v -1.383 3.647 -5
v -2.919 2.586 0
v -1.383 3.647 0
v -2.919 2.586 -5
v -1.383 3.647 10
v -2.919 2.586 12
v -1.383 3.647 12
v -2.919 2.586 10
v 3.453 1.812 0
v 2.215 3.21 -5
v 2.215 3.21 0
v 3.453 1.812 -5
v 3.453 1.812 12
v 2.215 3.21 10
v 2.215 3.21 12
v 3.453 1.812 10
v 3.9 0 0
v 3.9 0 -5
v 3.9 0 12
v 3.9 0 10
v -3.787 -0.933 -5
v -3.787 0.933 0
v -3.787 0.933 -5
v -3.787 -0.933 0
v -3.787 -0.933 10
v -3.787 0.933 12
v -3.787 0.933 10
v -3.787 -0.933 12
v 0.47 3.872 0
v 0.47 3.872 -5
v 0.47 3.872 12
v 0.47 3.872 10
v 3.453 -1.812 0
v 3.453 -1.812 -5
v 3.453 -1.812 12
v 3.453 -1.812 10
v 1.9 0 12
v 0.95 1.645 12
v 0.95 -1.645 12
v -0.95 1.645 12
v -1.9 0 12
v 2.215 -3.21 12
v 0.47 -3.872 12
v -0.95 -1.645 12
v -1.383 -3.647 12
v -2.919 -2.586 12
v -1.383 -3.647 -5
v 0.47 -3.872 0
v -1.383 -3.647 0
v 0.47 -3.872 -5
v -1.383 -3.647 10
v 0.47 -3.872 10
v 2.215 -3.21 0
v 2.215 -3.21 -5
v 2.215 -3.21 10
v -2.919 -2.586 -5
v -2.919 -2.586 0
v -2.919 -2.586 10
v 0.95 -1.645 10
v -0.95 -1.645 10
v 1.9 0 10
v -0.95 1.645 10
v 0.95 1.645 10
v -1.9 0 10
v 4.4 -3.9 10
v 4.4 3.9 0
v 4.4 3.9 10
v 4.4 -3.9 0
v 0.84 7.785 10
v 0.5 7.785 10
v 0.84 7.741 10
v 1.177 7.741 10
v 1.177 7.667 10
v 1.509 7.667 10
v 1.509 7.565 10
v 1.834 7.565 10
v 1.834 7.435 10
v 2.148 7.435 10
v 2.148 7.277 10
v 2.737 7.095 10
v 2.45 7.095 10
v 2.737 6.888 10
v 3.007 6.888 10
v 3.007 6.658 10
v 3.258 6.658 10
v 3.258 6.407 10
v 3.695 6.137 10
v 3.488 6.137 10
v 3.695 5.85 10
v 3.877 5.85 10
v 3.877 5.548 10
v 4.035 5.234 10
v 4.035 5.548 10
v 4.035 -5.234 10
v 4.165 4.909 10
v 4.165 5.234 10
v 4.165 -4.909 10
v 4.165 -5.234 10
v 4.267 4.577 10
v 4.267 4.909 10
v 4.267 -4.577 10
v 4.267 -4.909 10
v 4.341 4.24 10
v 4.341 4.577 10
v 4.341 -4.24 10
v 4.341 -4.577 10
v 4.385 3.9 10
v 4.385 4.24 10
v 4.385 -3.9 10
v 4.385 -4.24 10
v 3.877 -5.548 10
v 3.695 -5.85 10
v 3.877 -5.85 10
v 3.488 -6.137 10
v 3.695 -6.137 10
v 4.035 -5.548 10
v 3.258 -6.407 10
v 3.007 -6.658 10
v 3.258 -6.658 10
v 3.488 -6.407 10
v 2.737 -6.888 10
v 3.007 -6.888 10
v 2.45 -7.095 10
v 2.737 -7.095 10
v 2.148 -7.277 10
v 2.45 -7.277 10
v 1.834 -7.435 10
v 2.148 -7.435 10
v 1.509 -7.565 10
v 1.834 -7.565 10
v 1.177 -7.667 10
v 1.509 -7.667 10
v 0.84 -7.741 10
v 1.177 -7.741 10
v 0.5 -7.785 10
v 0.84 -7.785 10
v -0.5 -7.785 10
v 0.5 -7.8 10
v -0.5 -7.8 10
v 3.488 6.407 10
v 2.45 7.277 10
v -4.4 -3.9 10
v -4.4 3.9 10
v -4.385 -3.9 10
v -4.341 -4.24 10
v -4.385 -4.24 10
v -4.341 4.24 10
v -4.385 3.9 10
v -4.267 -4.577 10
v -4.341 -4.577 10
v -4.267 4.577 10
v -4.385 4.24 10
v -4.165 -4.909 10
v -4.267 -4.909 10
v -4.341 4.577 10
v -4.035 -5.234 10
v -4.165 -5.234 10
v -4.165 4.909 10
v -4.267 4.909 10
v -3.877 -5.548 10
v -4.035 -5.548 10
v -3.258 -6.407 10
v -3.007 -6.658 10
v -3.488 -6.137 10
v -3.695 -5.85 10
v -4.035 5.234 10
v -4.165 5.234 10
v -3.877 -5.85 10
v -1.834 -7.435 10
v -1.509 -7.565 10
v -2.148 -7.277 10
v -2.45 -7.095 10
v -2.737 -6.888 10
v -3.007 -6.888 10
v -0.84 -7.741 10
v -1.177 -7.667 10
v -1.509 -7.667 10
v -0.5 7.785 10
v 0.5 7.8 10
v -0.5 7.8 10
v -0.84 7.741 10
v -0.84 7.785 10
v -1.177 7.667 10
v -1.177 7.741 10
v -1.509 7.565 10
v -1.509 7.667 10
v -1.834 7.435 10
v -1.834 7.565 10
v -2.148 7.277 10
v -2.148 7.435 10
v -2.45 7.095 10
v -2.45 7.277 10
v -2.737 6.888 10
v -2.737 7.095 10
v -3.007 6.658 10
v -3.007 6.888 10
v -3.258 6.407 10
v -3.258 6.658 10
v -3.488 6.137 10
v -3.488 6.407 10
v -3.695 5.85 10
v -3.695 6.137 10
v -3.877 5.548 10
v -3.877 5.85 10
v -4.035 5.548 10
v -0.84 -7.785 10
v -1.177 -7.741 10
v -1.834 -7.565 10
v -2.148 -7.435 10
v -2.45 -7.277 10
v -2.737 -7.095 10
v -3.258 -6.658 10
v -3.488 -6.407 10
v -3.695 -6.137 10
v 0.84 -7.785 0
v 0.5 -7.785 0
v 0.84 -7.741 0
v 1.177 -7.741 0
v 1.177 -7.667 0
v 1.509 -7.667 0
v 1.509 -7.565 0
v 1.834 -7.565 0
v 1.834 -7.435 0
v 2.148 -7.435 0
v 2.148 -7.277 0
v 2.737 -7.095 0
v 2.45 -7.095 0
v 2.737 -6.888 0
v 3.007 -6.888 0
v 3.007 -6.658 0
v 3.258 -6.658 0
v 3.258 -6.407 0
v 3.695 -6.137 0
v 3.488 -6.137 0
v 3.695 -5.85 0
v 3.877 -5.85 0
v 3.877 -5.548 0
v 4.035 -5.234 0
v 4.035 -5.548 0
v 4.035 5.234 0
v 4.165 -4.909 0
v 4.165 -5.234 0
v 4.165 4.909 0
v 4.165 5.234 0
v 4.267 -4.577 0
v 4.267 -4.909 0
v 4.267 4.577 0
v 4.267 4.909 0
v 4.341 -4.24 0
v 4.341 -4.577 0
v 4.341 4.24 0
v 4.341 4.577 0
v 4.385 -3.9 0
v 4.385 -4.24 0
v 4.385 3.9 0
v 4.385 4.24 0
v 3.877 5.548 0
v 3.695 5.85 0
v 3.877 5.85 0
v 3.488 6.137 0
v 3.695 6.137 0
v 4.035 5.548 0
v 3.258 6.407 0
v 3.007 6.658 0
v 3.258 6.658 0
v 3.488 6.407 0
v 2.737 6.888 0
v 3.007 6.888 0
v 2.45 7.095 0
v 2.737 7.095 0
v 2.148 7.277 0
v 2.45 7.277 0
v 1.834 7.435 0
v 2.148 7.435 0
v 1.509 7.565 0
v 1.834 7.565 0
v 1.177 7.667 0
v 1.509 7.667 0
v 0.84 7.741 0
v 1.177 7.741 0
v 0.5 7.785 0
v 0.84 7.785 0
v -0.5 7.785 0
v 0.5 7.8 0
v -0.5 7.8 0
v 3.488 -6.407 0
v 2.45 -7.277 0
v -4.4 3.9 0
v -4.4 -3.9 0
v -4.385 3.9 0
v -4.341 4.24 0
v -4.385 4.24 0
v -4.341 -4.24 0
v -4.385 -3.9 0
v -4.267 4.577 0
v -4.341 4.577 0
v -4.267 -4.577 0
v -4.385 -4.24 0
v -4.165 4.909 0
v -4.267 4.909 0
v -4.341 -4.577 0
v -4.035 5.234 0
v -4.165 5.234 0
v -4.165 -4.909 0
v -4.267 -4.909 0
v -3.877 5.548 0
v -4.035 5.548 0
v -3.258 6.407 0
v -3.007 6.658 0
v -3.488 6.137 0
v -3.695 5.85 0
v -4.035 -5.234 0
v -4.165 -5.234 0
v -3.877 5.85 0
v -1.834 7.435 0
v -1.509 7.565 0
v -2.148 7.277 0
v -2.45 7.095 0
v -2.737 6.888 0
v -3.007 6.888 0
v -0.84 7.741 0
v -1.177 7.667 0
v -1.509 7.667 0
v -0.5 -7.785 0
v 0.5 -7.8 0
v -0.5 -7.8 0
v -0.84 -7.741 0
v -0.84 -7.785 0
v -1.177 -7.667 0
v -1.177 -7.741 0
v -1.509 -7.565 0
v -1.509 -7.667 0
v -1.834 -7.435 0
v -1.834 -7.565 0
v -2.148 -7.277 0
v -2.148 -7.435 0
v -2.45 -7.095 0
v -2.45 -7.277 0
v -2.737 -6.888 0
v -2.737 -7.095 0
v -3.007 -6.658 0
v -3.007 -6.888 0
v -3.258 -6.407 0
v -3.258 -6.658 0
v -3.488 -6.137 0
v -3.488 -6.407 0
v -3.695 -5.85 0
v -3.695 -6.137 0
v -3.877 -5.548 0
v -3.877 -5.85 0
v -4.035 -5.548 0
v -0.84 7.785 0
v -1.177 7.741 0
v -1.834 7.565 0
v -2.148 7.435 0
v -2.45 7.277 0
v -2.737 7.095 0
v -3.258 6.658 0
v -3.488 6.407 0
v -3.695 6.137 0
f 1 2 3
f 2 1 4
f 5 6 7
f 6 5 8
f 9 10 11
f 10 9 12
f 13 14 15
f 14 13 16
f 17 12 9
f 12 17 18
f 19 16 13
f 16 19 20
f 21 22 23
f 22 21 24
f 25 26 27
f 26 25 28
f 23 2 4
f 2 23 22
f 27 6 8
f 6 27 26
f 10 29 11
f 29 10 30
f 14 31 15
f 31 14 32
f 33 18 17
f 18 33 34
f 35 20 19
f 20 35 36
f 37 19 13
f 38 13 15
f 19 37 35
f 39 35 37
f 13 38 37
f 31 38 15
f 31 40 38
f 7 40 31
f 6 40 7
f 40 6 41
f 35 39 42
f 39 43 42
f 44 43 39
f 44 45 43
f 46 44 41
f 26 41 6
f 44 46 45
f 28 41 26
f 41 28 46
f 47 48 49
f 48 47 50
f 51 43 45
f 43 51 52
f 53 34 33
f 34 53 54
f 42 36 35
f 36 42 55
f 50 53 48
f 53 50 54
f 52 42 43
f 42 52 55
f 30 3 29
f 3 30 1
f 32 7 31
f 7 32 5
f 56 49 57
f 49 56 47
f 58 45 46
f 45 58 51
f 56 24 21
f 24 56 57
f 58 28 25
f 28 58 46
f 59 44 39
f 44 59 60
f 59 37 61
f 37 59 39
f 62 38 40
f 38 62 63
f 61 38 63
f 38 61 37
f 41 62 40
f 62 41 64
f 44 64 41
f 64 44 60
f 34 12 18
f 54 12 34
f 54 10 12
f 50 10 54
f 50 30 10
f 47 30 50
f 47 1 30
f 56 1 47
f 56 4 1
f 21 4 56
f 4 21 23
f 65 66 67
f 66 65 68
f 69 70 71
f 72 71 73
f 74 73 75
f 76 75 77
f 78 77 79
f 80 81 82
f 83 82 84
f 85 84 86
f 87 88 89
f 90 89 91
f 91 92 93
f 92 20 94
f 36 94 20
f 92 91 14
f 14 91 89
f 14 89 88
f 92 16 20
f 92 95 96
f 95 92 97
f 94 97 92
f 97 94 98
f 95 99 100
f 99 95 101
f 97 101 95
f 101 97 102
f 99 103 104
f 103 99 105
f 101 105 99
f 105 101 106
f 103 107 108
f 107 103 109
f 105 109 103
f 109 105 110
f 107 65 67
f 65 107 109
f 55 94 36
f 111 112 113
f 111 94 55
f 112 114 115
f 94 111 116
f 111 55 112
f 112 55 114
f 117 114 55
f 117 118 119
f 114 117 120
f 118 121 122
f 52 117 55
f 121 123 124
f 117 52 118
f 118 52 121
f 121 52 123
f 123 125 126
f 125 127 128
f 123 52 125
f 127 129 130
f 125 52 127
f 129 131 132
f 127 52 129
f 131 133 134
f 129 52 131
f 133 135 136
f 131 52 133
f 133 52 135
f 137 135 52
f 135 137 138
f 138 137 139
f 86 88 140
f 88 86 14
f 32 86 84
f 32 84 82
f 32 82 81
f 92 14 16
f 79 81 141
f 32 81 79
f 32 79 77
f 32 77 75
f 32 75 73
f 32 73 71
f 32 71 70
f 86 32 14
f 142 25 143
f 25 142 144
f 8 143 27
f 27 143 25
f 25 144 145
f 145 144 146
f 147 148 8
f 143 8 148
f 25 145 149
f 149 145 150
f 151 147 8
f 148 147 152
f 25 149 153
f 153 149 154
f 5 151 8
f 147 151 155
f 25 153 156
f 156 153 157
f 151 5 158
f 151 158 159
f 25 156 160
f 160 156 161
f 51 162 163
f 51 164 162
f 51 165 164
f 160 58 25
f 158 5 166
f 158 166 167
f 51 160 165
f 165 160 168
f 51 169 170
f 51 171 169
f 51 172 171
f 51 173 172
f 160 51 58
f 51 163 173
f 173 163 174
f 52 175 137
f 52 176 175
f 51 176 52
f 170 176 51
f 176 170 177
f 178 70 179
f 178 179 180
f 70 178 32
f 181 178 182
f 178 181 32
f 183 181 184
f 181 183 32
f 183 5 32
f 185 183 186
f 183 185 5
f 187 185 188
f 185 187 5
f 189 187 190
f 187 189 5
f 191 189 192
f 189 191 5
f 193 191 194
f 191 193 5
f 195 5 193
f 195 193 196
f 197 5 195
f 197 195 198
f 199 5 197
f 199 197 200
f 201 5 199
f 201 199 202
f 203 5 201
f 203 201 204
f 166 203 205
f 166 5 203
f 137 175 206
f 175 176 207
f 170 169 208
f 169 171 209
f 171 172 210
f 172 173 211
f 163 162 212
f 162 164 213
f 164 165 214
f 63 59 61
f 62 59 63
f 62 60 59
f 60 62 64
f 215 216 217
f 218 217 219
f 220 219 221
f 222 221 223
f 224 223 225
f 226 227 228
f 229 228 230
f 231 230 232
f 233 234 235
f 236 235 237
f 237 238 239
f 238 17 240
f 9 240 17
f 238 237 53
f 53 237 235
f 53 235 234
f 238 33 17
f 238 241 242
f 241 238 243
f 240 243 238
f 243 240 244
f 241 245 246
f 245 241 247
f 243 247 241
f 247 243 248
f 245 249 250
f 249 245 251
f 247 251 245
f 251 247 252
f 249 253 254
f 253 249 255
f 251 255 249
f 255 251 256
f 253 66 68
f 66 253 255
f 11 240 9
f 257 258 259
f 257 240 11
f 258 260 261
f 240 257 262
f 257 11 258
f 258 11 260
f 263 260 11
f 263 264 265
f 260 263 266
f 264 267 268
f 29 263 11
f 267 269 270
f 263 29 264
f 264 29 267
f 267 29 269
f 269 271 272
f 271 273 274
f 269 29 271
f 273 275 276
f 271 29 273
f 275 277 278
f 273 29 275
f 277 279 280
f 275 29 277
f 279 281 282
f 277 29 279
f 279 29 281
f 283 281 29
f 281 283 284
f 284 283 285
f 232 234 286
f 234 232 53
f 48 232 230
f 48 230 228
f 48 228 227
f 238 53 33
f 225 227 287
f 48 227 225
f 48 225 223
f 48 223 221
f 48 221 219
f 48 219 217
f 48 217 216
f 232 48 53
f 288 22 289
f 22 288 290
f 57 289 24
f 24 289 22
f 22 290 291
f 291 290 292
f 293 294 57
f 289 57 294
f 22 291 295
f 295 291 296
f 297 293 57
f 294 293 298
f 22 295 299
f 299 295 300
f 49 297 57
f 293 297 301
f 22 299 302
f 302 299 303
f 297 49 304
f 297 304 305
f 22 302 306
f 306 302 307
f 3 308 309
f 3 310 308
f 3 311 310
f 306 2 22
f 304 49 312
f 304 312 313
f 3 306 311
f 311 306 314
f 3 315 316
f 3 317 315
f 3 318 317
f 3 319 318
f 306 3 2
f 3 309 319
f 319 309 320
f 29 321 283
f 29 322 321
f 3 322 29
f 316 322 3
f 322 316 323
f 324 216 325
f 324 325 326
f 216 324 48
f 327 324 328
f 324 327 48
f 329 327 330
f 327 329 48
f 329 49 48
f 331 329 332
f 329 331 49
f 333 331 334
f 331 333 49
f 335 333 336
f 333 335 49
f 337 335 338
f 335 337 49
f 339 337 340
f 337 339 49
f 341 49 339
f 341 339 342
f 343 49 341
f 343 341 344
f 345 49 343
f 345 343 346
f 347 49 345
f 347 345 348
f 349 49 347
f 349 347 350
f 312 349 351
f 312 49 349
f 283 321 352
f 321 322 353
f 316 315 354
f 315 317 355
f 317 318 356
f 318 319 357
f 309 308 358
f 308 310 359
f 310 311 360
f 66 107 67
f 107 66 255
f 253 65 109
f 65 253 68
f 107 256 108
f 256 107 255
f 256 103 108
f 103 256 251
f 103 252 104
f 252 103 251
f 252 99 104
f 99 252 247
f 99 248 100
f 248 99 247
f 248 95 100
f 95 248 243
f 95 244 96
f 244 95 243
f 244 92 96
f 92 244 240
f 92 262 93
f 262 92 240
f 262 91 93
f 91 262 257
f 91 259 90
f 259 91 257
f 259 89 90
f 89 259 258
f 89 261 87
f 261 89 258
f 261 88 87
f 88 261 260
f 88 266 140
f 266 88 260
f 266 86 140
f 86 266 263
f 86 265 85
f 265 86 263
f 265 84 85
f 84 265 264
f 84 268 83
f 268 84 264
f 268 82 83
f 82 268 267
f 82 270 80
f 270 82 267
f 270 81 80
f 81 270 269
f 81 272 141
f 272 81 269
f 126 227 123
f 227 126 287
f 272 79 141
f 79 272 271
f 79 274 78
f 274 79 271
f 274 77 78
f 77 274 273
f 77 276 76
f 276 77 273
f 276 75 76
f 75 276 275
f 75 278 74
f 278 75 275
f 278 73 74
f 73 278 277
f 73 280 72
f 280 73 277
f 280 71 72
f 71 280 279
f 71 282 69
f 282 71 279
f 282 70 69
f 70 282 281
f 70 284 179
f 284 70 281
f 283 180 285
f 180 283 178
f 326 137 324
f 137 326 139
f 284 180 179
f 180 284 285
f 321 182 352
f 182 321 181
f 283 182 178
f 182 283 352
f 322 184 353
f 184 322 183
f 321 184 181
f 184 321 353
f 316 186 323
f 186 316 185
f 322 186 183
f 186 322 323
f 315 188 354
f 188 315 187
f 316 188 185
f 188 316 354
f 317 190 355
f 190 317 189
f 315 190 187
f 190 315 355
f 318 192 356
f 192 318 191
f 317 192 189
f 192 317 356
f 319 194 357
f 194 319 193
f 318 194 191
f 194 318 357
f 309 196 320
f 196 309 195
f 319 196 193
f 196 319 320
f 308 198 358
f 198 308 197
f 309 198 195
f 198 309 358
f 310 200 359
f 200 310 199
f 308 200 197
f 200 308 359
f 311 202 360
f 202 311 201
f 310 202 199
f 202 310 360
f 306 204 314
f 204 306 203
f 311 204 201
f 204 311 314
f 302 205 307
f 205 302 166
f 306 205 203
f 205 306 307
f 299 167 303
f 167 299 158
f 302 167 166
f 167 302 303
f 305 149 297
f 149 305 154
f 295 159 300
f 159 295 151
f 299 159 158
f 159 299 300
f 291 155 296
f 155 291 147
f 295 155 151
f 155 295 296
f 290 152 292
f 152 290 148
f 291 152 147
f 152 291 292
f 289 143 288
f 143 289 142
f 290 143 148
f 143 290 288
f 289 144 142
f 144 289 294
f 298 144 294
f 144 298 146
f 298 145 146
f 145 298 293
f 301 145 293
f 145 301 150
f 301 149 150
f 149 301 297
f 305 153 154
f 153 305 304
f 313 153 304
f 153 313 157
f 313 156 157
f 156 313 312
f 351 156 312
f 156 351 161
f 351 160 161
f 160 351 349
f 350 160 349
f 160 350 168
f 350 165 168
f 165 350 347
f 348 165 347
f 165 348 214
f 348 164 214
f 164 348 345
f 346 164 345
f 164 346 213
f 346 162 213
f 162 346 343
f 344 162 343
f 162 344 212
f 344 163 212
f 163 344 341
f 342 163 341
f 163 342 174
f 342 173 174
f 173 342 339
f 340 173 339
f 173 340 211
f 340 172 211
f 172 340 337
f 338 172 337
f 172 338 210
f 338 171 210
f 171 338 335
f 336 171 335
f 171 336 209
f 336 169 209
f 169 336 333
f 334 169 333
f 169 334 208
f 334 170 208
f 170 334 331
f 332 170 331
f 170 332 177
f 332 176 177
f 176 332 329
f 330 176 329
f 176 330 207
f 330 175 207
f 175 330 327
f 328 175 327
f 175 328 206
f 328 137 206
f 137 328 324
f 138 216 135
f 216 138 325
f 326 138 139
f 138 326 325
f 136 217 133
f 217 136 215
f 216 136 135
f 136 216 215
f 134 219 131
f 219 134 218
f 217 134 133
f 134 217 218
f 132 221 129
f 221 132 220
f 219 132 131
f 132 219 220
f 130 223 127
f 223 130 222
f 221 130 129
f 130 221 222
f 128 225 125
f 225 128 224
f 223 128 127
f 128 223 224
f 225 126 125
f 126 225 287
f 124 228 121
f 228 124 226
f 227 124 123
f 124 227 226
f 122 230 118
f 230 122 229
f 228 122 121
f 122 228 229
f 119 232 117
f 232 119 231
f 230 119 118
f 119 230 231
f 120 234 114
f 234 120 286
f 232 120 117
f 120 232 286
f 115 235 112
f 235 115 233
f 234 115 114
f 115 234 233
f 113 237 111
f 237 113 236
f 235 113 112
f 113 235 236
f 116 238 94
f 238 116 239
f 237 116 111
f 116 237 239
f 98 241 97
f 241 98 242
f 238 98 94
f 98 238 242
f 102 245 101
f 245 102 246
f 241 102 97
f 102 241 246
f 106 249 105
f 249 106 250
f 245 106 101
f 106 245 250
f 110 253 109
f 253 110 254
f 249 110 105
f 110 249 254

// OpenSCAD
union() {
	union() {
		difference() {
			difference() {
				difference() {
					cylinder(center = false, h = 12, r = 3.9000000000);
					translate(v = [0, 0, 2]) {
						cylinder(center = false, h = 10, r = 1.9000000000);
					}
				}
				union() {
					translate(v = [0, 0, 2]) {
						rotate(a = [90, 0, 0]) {
							cube(center = true, size = [7.8000000000, 1, 10]);
						}
					}
					translate(v = [0, 0, 5]) {
						rotate(a = [90, 0, 0]) {
							cube(center = true, size = [7.8000000000, 1, 10]);
						}
					}
					translate(v = [0, 0, 8]) {
						rotate(a = [90, 0, 0]) {
							cube(center = true, size = [7.8000000000, 1, 10]);
						}
					}
				}
			}
		}
		translate(v = [0, 0, -5]) {
			cylinder(center = false, h = 5, r = 3.9000000000);
		}
	}
	translate(v = [3.9000000000, 0.0000000000, 5.0000000000]) {
		cube(center = true, size = [1, 7.8000000000, 10]);
	}
	translate(v = [3.8851593226, 0.3399073967, 5.0000000000]) {
		cube(center = true, size = [1, 7.8000000000, 10]);
	}
	translate(v = [3.8407502367, 0.6772278929, 5.0000000000]) {
		cube(center = true, size = [1, 7.8000000000, 10]);
	}
	translate(v = [3.7671107225, 1.0093942759, 5.0000000000]) {
		cube(center = true, size = [1, 7.8000000000, 10]);
	}
	translate(v = [3.6648012211, 1.3338785590, 5.0000000000]) {
		cube(center = true, size = [1, 7.8000000000, 10]);
	}
	translate(v = [3.5346003694, 1.6482112208, 5.0000000000]) {
		cube(center = true, size = [1, 7.8000000000, 10]);
	}
	translate(v = [3.3774990748, 1.9500000000, 5.0000000000]) {
		cube(center = true, size = [1, 7.8000000000, 10]);
	}
	translate(v = [3.1946929727, 2.2369481018, 5.0000000000]) {
		cube(center = true, size = [1, 7.8000000000, 10]);
	}
	translate(v = [2.9875733282, 2.5068716778, 5.0000000000]) {
		cube(center = true, size = [1, 7.8000000000, 10]);
	}
	translate(v = [2.7577164466, 2.7577164466, 5.0000000000]) {
		cube(center = true, size = [1, 7.8000000000, 10]);
	}
	translate(v = [2.5068716778, 2.9875733282, 5.0000000000]) {
		cube(center = true, size = [1, 7.8000000000, 10]);
	}
	translate(v = [2.2369481018, 3.1946929727, 5.0000000000]) {
		cube(center = true, size = [1, 7.8000000000, 10]);
	}
	translate(v = [1.9500000000, 3.3774990748, 5.0000000000]) {
		cube(center = true, size = [1, 7.8000000000, 10]);
	}
	translate(v = [1.6482112208, 3.5346003694, 5.0000000000]) {
		cube(center = true, size = [1, 7.8000000000, 10]);
	}
	translate(v = [1.3338785590, 3.6648012211, 5.0000000000]) {
		cube(center = true, size = [1, 7.8000000000, 10]);
	}
	translate(v = [1.0093942759, 3.7671107225, 5.0000000000]) {
		cube(center = true, size = [1, 7.8000000000, 10]);
	}
	translate(v = [0.6772278929, 3.8407502367, 5.0000000000]) {
		cube(center = true, size = [1, 7.8000000000, 10]);
	}
	translate(v = [0.3399073967, 3.8851593226, 5.0000000000]) {
		cube(center = true, size = [1, 7.8000000000, 10]);
	}
	translate(v = [0.0000000000, 3.9000000000, 5.0000000000]) {
		cube(center = true, size = [1, 7.8000000000, 10]);
	}
	translate(v = [-0.3399073967, 3.8851593226, 5.0000000000]) {
		cube(center = true, size = [1, 7.8000000000, 10]);
	}
	translate(v = [-0.6772278929, 3.8407502367, 5.0000000000]) {
		cube(center = true, size = [1, 7.8000000000, 10]);
	}
	translate(v = [-1.0093942759, 3.7671107225, 5.0000000000]) {
		cube(center = true, size = [1, 7.8000000000, 10]);
	}
	translate(v = [-1.3338785590, 3.6648012211, 5.0000000000]) {
		cube(center = true, size = [1, 7.8000000000, 10]);
	}
	translate(v = [-1.6482112208, 3.5346003694, 5.0000000000]) {
		cube(center = true, size = [1, 7.8000000000, 10]);
	}
	translate(v = [-1.9500000000, 3.3774990748, 5.0000000000]) {
		cube(center = true, size = [1, 7.8000000000, 10]);
	}
	translate(v = [-2.2369481018, 3.1946929727, 5.0000000000]) {
		cube(center = true, size = [1, 7.8000000000, 10]);
	}
	translate(v = [-2.5068716778, 2.9875733282, 5.0000000000]) {
		cube(center = true, size = [1, 7.8000000000, 10]);
	}
	translate(v = [-2.7577164466, 2.7577164466, 5.0000000000]) {
		cube(center = true, size = [1, 7.8000000000, 10]);
	}
	translate(v = [-2.9875733282, 2.5068716778, 5.0000000000]) {
		cube(center = true, size = [1, 7.8000000000, 10]);
	}
	translate(v = [-3.1946929727, 2.2369481018, 5.0000000000]) {
		cube(center = true, size = [1, 7.8000000000, 10]);
	}
	translate(v = [-3.3774990748, 1.9500000000, 5.0000000000]) {
		cube(center = true, size = [1, 7.8000000000, 10]);
	}
	translate(v = [-3.5346003694, 1.6482112208, 5.0000000000]) {
		cube(center = true, size = [1, 7.8000000000, 10]);
	}
	translate(v = [-3.6648012211, 1.3338785590, 5.0000000000]) {
		cube(center = true, size = [1, 7.8000000000, 10]);
	}
	translate(v = [-3.7671107225, 1.0093942759, 5.0000000000]) {
		cube(center = true, size = [1, 7.8000000000, 10]);
	}
	translate(v = [-3.8407502367, 0.6772278929, 5.0000000000]) {
		cube(center = true, size = [1, 7.8000000000, 10]);
	}
	translate(v = [-3.8851593226, 0.3399073967, 5.0000000000]) {
		cube(center = true, size = [1, 7.8000000000, 10]);
	}
	translate(v = [-3.9000000000, 0.0000000000, 5.0000000000]) {
		cube(center = true, size = [1, 7.8000000000, 10]);
	}
	translate(v = [-3.8851593226, -0.3399073967, 5.0000000000]) {
		cube(center = true, size = [1, 7.8000000000, 10]);
	}
	translate(v = [-3.8407502367, -0.6772278929, 5.0000000000]) {
		cube(center = true, size = [1, 7.8000000000, 10]);
	}
	translate(v = [-3.7671107225, -1.0093942759, 5.0000000000]) {
		cube(center = true, size = [1, 7.8000000000, 10]);
	}
	translate(v = [-3.6648012211, -1.3338785590, 5.0000000000]) {
		cube(center = true, size = [1, 7.8000000000, 10]);
	}
	translate(v = [-3.5346003694, -1.6482112208, 5.0000000000]) {
		cube(center = true, size = [1, 7.8000000000, 10]);
	}
	translate(v = [-3.3774990748, -1.9500000000, 5.0000000000]) {
		cube(center = true, size = [1, 7.8000000000, 10]);
	}
	translate(v = [-3.1946929727, -2.2369481018, 5.0000000000]) {
		cube(center = true, size = [1, 7.8000000000, 10]);
	}
	translate(v = [-2.9875733282, -2.5068716778, 5.0000000000]) {
		cube(center = true, size = [1, 7.8000000000, 10]);
	}
	translate(v = [-2.7577164466, -2.7577164466, 5.0000000000]) {
		cube(center = true, size = [1, 7.8000000000, 10]);
	}
	translate(v = [-2.5068716778, -2.9875733282, 5.0000000000]) {
		cube(center = true, size = [1, 7.8000000000, 10]);
	}
	translate(v = [-2.2369481018, -3.1946929727, 5.0000000000]) {
		cube(center = true, size = [1, 7.8000000000, 10]);
	}
	translate(v = [-1.9500000000, -3.3774990748, 5.0000000000]) {
		cube(center = true, size = [1, 7.8000000000, 10]);
	}
	translate(v = [-1.6482112208, -3.5346003694, 5.0000000000]) {
		cube(center = true, size = [1, 7.8000000000, 10]);
	}
	translate(v = [-1.3338785590, -3.6648012211, 5.0000000000]) {
		cube(center = true, size = [1, 7.8000000000, 10]);
	}
	translate(v = [-1.0093942759, -3.7671107225, 5.0000000000]) {
		cube(center = true, size = [1, 7.8000000000, 10]);
	}
	translate(v = [-0.6772278929, -3.8407502367, 5.0000000000]) {
		cube(center = true, size = [1, 7.8000000000, 10]);
	}
	translate(v = [-0.3399073967, -3.8851593226, 5.0000000000]) {
		cube(center = true, size = [1, 7.8000000000, 10]);
	}
	translate(v = [-0.0000000000, -3.9000000000, 5.0000000000]) {
		cube(center = true, size = [1, 7.8000000000, 10]);
	}
	translate(v = [0.3399073967, -3.8851593226, 5.0000000000]) {
		cube(center = true, size = [1, 7.8000000000, 10]);
	}
	translate(v = [0.6772278929, -3.8407502367, 5.0000000000]) {
		cube(center = true, size = [1, 7.8000000000, 10]);
	}
	translate(v = [1.0093942759, -3.7671107225, 5.0000000000]) {
		cube(center = true, size = [1, 7.8000000000, 10]);
	}
	translate(v = [1.3338785590, -3.6648012211, 5.0000000000]) {
		cube(center = true, size = [1, 7.8000000000, 10]);
	}
	translate(v = [1.6482112208, -3.5346003694, 5.0000000000]) {
		cube(center = true, size = [1, 7.8000000000, 10]);
	}
	translate(v = [1.9500000000, -3.3774990748, 5.0000000000]) {
		cube(center = true, size = [1, 7.8000000000, 10]);
	}
	translate(v = [2.2369481018, -3.1946929727, 5.0000000000]) {
		cube(center = true, size = [1, 7.8000000000, 10]);
	}
	translate(v = [2.5068716778, -2.9875733282, 5.0000000000]) {
		cube(center = true, size = [1, 7.8000000000, 10]);
	}
	translate(v = [2.7577164466, -2.7577164466, 5.0000000000]) {
		cube(center = true, size = [1, 7.8000000000, 10]);
	}
	translate(v = [2.9875733282, -2.5068716778, 5.0000000000]) {
		cube(center = true, size = [1, 7.8000000000, 10]);
	}
	translate(v = [3.1946929727, -2.2369481018, 5.0000000000]) {
		cube(center = true, size = [1, 7.8000000000, 10]);
	}
	translate(v = [3.3774990748, -1.9500000000, 5.0000000000]) {
		cube(center = true, size = [1, 7.8000000000, 10]);
	}
	translate(v = [3.5346003694, -1.6482112208, 5.0000000000]) {
		cube(center = true, size = [1, 7.8000000000, 10]);
	}
	translate(v = [3.6648012211, -1.3338785590, 5.0000000000]) {
		cube(center = true, size = [1, 7.8000000000, 10]);
	}
	translate(v = [3.7671107225, -1.0093942759, 5.0000000000]) {
		cube(center = true, size = [1, 7.8000000000, 10]);
	}
	translate(v = [3.8407502367, -0.6772278929, 5.0000000000]) {
		cube(center = true, size = [1, 7.8000000000, 10]);
	}
	translate(v = [3.8851593226, -0.3399073967, 5.0000000000]) {
		cube(center = true, size = [1, 7.8000000000, 10]);
	}
}
